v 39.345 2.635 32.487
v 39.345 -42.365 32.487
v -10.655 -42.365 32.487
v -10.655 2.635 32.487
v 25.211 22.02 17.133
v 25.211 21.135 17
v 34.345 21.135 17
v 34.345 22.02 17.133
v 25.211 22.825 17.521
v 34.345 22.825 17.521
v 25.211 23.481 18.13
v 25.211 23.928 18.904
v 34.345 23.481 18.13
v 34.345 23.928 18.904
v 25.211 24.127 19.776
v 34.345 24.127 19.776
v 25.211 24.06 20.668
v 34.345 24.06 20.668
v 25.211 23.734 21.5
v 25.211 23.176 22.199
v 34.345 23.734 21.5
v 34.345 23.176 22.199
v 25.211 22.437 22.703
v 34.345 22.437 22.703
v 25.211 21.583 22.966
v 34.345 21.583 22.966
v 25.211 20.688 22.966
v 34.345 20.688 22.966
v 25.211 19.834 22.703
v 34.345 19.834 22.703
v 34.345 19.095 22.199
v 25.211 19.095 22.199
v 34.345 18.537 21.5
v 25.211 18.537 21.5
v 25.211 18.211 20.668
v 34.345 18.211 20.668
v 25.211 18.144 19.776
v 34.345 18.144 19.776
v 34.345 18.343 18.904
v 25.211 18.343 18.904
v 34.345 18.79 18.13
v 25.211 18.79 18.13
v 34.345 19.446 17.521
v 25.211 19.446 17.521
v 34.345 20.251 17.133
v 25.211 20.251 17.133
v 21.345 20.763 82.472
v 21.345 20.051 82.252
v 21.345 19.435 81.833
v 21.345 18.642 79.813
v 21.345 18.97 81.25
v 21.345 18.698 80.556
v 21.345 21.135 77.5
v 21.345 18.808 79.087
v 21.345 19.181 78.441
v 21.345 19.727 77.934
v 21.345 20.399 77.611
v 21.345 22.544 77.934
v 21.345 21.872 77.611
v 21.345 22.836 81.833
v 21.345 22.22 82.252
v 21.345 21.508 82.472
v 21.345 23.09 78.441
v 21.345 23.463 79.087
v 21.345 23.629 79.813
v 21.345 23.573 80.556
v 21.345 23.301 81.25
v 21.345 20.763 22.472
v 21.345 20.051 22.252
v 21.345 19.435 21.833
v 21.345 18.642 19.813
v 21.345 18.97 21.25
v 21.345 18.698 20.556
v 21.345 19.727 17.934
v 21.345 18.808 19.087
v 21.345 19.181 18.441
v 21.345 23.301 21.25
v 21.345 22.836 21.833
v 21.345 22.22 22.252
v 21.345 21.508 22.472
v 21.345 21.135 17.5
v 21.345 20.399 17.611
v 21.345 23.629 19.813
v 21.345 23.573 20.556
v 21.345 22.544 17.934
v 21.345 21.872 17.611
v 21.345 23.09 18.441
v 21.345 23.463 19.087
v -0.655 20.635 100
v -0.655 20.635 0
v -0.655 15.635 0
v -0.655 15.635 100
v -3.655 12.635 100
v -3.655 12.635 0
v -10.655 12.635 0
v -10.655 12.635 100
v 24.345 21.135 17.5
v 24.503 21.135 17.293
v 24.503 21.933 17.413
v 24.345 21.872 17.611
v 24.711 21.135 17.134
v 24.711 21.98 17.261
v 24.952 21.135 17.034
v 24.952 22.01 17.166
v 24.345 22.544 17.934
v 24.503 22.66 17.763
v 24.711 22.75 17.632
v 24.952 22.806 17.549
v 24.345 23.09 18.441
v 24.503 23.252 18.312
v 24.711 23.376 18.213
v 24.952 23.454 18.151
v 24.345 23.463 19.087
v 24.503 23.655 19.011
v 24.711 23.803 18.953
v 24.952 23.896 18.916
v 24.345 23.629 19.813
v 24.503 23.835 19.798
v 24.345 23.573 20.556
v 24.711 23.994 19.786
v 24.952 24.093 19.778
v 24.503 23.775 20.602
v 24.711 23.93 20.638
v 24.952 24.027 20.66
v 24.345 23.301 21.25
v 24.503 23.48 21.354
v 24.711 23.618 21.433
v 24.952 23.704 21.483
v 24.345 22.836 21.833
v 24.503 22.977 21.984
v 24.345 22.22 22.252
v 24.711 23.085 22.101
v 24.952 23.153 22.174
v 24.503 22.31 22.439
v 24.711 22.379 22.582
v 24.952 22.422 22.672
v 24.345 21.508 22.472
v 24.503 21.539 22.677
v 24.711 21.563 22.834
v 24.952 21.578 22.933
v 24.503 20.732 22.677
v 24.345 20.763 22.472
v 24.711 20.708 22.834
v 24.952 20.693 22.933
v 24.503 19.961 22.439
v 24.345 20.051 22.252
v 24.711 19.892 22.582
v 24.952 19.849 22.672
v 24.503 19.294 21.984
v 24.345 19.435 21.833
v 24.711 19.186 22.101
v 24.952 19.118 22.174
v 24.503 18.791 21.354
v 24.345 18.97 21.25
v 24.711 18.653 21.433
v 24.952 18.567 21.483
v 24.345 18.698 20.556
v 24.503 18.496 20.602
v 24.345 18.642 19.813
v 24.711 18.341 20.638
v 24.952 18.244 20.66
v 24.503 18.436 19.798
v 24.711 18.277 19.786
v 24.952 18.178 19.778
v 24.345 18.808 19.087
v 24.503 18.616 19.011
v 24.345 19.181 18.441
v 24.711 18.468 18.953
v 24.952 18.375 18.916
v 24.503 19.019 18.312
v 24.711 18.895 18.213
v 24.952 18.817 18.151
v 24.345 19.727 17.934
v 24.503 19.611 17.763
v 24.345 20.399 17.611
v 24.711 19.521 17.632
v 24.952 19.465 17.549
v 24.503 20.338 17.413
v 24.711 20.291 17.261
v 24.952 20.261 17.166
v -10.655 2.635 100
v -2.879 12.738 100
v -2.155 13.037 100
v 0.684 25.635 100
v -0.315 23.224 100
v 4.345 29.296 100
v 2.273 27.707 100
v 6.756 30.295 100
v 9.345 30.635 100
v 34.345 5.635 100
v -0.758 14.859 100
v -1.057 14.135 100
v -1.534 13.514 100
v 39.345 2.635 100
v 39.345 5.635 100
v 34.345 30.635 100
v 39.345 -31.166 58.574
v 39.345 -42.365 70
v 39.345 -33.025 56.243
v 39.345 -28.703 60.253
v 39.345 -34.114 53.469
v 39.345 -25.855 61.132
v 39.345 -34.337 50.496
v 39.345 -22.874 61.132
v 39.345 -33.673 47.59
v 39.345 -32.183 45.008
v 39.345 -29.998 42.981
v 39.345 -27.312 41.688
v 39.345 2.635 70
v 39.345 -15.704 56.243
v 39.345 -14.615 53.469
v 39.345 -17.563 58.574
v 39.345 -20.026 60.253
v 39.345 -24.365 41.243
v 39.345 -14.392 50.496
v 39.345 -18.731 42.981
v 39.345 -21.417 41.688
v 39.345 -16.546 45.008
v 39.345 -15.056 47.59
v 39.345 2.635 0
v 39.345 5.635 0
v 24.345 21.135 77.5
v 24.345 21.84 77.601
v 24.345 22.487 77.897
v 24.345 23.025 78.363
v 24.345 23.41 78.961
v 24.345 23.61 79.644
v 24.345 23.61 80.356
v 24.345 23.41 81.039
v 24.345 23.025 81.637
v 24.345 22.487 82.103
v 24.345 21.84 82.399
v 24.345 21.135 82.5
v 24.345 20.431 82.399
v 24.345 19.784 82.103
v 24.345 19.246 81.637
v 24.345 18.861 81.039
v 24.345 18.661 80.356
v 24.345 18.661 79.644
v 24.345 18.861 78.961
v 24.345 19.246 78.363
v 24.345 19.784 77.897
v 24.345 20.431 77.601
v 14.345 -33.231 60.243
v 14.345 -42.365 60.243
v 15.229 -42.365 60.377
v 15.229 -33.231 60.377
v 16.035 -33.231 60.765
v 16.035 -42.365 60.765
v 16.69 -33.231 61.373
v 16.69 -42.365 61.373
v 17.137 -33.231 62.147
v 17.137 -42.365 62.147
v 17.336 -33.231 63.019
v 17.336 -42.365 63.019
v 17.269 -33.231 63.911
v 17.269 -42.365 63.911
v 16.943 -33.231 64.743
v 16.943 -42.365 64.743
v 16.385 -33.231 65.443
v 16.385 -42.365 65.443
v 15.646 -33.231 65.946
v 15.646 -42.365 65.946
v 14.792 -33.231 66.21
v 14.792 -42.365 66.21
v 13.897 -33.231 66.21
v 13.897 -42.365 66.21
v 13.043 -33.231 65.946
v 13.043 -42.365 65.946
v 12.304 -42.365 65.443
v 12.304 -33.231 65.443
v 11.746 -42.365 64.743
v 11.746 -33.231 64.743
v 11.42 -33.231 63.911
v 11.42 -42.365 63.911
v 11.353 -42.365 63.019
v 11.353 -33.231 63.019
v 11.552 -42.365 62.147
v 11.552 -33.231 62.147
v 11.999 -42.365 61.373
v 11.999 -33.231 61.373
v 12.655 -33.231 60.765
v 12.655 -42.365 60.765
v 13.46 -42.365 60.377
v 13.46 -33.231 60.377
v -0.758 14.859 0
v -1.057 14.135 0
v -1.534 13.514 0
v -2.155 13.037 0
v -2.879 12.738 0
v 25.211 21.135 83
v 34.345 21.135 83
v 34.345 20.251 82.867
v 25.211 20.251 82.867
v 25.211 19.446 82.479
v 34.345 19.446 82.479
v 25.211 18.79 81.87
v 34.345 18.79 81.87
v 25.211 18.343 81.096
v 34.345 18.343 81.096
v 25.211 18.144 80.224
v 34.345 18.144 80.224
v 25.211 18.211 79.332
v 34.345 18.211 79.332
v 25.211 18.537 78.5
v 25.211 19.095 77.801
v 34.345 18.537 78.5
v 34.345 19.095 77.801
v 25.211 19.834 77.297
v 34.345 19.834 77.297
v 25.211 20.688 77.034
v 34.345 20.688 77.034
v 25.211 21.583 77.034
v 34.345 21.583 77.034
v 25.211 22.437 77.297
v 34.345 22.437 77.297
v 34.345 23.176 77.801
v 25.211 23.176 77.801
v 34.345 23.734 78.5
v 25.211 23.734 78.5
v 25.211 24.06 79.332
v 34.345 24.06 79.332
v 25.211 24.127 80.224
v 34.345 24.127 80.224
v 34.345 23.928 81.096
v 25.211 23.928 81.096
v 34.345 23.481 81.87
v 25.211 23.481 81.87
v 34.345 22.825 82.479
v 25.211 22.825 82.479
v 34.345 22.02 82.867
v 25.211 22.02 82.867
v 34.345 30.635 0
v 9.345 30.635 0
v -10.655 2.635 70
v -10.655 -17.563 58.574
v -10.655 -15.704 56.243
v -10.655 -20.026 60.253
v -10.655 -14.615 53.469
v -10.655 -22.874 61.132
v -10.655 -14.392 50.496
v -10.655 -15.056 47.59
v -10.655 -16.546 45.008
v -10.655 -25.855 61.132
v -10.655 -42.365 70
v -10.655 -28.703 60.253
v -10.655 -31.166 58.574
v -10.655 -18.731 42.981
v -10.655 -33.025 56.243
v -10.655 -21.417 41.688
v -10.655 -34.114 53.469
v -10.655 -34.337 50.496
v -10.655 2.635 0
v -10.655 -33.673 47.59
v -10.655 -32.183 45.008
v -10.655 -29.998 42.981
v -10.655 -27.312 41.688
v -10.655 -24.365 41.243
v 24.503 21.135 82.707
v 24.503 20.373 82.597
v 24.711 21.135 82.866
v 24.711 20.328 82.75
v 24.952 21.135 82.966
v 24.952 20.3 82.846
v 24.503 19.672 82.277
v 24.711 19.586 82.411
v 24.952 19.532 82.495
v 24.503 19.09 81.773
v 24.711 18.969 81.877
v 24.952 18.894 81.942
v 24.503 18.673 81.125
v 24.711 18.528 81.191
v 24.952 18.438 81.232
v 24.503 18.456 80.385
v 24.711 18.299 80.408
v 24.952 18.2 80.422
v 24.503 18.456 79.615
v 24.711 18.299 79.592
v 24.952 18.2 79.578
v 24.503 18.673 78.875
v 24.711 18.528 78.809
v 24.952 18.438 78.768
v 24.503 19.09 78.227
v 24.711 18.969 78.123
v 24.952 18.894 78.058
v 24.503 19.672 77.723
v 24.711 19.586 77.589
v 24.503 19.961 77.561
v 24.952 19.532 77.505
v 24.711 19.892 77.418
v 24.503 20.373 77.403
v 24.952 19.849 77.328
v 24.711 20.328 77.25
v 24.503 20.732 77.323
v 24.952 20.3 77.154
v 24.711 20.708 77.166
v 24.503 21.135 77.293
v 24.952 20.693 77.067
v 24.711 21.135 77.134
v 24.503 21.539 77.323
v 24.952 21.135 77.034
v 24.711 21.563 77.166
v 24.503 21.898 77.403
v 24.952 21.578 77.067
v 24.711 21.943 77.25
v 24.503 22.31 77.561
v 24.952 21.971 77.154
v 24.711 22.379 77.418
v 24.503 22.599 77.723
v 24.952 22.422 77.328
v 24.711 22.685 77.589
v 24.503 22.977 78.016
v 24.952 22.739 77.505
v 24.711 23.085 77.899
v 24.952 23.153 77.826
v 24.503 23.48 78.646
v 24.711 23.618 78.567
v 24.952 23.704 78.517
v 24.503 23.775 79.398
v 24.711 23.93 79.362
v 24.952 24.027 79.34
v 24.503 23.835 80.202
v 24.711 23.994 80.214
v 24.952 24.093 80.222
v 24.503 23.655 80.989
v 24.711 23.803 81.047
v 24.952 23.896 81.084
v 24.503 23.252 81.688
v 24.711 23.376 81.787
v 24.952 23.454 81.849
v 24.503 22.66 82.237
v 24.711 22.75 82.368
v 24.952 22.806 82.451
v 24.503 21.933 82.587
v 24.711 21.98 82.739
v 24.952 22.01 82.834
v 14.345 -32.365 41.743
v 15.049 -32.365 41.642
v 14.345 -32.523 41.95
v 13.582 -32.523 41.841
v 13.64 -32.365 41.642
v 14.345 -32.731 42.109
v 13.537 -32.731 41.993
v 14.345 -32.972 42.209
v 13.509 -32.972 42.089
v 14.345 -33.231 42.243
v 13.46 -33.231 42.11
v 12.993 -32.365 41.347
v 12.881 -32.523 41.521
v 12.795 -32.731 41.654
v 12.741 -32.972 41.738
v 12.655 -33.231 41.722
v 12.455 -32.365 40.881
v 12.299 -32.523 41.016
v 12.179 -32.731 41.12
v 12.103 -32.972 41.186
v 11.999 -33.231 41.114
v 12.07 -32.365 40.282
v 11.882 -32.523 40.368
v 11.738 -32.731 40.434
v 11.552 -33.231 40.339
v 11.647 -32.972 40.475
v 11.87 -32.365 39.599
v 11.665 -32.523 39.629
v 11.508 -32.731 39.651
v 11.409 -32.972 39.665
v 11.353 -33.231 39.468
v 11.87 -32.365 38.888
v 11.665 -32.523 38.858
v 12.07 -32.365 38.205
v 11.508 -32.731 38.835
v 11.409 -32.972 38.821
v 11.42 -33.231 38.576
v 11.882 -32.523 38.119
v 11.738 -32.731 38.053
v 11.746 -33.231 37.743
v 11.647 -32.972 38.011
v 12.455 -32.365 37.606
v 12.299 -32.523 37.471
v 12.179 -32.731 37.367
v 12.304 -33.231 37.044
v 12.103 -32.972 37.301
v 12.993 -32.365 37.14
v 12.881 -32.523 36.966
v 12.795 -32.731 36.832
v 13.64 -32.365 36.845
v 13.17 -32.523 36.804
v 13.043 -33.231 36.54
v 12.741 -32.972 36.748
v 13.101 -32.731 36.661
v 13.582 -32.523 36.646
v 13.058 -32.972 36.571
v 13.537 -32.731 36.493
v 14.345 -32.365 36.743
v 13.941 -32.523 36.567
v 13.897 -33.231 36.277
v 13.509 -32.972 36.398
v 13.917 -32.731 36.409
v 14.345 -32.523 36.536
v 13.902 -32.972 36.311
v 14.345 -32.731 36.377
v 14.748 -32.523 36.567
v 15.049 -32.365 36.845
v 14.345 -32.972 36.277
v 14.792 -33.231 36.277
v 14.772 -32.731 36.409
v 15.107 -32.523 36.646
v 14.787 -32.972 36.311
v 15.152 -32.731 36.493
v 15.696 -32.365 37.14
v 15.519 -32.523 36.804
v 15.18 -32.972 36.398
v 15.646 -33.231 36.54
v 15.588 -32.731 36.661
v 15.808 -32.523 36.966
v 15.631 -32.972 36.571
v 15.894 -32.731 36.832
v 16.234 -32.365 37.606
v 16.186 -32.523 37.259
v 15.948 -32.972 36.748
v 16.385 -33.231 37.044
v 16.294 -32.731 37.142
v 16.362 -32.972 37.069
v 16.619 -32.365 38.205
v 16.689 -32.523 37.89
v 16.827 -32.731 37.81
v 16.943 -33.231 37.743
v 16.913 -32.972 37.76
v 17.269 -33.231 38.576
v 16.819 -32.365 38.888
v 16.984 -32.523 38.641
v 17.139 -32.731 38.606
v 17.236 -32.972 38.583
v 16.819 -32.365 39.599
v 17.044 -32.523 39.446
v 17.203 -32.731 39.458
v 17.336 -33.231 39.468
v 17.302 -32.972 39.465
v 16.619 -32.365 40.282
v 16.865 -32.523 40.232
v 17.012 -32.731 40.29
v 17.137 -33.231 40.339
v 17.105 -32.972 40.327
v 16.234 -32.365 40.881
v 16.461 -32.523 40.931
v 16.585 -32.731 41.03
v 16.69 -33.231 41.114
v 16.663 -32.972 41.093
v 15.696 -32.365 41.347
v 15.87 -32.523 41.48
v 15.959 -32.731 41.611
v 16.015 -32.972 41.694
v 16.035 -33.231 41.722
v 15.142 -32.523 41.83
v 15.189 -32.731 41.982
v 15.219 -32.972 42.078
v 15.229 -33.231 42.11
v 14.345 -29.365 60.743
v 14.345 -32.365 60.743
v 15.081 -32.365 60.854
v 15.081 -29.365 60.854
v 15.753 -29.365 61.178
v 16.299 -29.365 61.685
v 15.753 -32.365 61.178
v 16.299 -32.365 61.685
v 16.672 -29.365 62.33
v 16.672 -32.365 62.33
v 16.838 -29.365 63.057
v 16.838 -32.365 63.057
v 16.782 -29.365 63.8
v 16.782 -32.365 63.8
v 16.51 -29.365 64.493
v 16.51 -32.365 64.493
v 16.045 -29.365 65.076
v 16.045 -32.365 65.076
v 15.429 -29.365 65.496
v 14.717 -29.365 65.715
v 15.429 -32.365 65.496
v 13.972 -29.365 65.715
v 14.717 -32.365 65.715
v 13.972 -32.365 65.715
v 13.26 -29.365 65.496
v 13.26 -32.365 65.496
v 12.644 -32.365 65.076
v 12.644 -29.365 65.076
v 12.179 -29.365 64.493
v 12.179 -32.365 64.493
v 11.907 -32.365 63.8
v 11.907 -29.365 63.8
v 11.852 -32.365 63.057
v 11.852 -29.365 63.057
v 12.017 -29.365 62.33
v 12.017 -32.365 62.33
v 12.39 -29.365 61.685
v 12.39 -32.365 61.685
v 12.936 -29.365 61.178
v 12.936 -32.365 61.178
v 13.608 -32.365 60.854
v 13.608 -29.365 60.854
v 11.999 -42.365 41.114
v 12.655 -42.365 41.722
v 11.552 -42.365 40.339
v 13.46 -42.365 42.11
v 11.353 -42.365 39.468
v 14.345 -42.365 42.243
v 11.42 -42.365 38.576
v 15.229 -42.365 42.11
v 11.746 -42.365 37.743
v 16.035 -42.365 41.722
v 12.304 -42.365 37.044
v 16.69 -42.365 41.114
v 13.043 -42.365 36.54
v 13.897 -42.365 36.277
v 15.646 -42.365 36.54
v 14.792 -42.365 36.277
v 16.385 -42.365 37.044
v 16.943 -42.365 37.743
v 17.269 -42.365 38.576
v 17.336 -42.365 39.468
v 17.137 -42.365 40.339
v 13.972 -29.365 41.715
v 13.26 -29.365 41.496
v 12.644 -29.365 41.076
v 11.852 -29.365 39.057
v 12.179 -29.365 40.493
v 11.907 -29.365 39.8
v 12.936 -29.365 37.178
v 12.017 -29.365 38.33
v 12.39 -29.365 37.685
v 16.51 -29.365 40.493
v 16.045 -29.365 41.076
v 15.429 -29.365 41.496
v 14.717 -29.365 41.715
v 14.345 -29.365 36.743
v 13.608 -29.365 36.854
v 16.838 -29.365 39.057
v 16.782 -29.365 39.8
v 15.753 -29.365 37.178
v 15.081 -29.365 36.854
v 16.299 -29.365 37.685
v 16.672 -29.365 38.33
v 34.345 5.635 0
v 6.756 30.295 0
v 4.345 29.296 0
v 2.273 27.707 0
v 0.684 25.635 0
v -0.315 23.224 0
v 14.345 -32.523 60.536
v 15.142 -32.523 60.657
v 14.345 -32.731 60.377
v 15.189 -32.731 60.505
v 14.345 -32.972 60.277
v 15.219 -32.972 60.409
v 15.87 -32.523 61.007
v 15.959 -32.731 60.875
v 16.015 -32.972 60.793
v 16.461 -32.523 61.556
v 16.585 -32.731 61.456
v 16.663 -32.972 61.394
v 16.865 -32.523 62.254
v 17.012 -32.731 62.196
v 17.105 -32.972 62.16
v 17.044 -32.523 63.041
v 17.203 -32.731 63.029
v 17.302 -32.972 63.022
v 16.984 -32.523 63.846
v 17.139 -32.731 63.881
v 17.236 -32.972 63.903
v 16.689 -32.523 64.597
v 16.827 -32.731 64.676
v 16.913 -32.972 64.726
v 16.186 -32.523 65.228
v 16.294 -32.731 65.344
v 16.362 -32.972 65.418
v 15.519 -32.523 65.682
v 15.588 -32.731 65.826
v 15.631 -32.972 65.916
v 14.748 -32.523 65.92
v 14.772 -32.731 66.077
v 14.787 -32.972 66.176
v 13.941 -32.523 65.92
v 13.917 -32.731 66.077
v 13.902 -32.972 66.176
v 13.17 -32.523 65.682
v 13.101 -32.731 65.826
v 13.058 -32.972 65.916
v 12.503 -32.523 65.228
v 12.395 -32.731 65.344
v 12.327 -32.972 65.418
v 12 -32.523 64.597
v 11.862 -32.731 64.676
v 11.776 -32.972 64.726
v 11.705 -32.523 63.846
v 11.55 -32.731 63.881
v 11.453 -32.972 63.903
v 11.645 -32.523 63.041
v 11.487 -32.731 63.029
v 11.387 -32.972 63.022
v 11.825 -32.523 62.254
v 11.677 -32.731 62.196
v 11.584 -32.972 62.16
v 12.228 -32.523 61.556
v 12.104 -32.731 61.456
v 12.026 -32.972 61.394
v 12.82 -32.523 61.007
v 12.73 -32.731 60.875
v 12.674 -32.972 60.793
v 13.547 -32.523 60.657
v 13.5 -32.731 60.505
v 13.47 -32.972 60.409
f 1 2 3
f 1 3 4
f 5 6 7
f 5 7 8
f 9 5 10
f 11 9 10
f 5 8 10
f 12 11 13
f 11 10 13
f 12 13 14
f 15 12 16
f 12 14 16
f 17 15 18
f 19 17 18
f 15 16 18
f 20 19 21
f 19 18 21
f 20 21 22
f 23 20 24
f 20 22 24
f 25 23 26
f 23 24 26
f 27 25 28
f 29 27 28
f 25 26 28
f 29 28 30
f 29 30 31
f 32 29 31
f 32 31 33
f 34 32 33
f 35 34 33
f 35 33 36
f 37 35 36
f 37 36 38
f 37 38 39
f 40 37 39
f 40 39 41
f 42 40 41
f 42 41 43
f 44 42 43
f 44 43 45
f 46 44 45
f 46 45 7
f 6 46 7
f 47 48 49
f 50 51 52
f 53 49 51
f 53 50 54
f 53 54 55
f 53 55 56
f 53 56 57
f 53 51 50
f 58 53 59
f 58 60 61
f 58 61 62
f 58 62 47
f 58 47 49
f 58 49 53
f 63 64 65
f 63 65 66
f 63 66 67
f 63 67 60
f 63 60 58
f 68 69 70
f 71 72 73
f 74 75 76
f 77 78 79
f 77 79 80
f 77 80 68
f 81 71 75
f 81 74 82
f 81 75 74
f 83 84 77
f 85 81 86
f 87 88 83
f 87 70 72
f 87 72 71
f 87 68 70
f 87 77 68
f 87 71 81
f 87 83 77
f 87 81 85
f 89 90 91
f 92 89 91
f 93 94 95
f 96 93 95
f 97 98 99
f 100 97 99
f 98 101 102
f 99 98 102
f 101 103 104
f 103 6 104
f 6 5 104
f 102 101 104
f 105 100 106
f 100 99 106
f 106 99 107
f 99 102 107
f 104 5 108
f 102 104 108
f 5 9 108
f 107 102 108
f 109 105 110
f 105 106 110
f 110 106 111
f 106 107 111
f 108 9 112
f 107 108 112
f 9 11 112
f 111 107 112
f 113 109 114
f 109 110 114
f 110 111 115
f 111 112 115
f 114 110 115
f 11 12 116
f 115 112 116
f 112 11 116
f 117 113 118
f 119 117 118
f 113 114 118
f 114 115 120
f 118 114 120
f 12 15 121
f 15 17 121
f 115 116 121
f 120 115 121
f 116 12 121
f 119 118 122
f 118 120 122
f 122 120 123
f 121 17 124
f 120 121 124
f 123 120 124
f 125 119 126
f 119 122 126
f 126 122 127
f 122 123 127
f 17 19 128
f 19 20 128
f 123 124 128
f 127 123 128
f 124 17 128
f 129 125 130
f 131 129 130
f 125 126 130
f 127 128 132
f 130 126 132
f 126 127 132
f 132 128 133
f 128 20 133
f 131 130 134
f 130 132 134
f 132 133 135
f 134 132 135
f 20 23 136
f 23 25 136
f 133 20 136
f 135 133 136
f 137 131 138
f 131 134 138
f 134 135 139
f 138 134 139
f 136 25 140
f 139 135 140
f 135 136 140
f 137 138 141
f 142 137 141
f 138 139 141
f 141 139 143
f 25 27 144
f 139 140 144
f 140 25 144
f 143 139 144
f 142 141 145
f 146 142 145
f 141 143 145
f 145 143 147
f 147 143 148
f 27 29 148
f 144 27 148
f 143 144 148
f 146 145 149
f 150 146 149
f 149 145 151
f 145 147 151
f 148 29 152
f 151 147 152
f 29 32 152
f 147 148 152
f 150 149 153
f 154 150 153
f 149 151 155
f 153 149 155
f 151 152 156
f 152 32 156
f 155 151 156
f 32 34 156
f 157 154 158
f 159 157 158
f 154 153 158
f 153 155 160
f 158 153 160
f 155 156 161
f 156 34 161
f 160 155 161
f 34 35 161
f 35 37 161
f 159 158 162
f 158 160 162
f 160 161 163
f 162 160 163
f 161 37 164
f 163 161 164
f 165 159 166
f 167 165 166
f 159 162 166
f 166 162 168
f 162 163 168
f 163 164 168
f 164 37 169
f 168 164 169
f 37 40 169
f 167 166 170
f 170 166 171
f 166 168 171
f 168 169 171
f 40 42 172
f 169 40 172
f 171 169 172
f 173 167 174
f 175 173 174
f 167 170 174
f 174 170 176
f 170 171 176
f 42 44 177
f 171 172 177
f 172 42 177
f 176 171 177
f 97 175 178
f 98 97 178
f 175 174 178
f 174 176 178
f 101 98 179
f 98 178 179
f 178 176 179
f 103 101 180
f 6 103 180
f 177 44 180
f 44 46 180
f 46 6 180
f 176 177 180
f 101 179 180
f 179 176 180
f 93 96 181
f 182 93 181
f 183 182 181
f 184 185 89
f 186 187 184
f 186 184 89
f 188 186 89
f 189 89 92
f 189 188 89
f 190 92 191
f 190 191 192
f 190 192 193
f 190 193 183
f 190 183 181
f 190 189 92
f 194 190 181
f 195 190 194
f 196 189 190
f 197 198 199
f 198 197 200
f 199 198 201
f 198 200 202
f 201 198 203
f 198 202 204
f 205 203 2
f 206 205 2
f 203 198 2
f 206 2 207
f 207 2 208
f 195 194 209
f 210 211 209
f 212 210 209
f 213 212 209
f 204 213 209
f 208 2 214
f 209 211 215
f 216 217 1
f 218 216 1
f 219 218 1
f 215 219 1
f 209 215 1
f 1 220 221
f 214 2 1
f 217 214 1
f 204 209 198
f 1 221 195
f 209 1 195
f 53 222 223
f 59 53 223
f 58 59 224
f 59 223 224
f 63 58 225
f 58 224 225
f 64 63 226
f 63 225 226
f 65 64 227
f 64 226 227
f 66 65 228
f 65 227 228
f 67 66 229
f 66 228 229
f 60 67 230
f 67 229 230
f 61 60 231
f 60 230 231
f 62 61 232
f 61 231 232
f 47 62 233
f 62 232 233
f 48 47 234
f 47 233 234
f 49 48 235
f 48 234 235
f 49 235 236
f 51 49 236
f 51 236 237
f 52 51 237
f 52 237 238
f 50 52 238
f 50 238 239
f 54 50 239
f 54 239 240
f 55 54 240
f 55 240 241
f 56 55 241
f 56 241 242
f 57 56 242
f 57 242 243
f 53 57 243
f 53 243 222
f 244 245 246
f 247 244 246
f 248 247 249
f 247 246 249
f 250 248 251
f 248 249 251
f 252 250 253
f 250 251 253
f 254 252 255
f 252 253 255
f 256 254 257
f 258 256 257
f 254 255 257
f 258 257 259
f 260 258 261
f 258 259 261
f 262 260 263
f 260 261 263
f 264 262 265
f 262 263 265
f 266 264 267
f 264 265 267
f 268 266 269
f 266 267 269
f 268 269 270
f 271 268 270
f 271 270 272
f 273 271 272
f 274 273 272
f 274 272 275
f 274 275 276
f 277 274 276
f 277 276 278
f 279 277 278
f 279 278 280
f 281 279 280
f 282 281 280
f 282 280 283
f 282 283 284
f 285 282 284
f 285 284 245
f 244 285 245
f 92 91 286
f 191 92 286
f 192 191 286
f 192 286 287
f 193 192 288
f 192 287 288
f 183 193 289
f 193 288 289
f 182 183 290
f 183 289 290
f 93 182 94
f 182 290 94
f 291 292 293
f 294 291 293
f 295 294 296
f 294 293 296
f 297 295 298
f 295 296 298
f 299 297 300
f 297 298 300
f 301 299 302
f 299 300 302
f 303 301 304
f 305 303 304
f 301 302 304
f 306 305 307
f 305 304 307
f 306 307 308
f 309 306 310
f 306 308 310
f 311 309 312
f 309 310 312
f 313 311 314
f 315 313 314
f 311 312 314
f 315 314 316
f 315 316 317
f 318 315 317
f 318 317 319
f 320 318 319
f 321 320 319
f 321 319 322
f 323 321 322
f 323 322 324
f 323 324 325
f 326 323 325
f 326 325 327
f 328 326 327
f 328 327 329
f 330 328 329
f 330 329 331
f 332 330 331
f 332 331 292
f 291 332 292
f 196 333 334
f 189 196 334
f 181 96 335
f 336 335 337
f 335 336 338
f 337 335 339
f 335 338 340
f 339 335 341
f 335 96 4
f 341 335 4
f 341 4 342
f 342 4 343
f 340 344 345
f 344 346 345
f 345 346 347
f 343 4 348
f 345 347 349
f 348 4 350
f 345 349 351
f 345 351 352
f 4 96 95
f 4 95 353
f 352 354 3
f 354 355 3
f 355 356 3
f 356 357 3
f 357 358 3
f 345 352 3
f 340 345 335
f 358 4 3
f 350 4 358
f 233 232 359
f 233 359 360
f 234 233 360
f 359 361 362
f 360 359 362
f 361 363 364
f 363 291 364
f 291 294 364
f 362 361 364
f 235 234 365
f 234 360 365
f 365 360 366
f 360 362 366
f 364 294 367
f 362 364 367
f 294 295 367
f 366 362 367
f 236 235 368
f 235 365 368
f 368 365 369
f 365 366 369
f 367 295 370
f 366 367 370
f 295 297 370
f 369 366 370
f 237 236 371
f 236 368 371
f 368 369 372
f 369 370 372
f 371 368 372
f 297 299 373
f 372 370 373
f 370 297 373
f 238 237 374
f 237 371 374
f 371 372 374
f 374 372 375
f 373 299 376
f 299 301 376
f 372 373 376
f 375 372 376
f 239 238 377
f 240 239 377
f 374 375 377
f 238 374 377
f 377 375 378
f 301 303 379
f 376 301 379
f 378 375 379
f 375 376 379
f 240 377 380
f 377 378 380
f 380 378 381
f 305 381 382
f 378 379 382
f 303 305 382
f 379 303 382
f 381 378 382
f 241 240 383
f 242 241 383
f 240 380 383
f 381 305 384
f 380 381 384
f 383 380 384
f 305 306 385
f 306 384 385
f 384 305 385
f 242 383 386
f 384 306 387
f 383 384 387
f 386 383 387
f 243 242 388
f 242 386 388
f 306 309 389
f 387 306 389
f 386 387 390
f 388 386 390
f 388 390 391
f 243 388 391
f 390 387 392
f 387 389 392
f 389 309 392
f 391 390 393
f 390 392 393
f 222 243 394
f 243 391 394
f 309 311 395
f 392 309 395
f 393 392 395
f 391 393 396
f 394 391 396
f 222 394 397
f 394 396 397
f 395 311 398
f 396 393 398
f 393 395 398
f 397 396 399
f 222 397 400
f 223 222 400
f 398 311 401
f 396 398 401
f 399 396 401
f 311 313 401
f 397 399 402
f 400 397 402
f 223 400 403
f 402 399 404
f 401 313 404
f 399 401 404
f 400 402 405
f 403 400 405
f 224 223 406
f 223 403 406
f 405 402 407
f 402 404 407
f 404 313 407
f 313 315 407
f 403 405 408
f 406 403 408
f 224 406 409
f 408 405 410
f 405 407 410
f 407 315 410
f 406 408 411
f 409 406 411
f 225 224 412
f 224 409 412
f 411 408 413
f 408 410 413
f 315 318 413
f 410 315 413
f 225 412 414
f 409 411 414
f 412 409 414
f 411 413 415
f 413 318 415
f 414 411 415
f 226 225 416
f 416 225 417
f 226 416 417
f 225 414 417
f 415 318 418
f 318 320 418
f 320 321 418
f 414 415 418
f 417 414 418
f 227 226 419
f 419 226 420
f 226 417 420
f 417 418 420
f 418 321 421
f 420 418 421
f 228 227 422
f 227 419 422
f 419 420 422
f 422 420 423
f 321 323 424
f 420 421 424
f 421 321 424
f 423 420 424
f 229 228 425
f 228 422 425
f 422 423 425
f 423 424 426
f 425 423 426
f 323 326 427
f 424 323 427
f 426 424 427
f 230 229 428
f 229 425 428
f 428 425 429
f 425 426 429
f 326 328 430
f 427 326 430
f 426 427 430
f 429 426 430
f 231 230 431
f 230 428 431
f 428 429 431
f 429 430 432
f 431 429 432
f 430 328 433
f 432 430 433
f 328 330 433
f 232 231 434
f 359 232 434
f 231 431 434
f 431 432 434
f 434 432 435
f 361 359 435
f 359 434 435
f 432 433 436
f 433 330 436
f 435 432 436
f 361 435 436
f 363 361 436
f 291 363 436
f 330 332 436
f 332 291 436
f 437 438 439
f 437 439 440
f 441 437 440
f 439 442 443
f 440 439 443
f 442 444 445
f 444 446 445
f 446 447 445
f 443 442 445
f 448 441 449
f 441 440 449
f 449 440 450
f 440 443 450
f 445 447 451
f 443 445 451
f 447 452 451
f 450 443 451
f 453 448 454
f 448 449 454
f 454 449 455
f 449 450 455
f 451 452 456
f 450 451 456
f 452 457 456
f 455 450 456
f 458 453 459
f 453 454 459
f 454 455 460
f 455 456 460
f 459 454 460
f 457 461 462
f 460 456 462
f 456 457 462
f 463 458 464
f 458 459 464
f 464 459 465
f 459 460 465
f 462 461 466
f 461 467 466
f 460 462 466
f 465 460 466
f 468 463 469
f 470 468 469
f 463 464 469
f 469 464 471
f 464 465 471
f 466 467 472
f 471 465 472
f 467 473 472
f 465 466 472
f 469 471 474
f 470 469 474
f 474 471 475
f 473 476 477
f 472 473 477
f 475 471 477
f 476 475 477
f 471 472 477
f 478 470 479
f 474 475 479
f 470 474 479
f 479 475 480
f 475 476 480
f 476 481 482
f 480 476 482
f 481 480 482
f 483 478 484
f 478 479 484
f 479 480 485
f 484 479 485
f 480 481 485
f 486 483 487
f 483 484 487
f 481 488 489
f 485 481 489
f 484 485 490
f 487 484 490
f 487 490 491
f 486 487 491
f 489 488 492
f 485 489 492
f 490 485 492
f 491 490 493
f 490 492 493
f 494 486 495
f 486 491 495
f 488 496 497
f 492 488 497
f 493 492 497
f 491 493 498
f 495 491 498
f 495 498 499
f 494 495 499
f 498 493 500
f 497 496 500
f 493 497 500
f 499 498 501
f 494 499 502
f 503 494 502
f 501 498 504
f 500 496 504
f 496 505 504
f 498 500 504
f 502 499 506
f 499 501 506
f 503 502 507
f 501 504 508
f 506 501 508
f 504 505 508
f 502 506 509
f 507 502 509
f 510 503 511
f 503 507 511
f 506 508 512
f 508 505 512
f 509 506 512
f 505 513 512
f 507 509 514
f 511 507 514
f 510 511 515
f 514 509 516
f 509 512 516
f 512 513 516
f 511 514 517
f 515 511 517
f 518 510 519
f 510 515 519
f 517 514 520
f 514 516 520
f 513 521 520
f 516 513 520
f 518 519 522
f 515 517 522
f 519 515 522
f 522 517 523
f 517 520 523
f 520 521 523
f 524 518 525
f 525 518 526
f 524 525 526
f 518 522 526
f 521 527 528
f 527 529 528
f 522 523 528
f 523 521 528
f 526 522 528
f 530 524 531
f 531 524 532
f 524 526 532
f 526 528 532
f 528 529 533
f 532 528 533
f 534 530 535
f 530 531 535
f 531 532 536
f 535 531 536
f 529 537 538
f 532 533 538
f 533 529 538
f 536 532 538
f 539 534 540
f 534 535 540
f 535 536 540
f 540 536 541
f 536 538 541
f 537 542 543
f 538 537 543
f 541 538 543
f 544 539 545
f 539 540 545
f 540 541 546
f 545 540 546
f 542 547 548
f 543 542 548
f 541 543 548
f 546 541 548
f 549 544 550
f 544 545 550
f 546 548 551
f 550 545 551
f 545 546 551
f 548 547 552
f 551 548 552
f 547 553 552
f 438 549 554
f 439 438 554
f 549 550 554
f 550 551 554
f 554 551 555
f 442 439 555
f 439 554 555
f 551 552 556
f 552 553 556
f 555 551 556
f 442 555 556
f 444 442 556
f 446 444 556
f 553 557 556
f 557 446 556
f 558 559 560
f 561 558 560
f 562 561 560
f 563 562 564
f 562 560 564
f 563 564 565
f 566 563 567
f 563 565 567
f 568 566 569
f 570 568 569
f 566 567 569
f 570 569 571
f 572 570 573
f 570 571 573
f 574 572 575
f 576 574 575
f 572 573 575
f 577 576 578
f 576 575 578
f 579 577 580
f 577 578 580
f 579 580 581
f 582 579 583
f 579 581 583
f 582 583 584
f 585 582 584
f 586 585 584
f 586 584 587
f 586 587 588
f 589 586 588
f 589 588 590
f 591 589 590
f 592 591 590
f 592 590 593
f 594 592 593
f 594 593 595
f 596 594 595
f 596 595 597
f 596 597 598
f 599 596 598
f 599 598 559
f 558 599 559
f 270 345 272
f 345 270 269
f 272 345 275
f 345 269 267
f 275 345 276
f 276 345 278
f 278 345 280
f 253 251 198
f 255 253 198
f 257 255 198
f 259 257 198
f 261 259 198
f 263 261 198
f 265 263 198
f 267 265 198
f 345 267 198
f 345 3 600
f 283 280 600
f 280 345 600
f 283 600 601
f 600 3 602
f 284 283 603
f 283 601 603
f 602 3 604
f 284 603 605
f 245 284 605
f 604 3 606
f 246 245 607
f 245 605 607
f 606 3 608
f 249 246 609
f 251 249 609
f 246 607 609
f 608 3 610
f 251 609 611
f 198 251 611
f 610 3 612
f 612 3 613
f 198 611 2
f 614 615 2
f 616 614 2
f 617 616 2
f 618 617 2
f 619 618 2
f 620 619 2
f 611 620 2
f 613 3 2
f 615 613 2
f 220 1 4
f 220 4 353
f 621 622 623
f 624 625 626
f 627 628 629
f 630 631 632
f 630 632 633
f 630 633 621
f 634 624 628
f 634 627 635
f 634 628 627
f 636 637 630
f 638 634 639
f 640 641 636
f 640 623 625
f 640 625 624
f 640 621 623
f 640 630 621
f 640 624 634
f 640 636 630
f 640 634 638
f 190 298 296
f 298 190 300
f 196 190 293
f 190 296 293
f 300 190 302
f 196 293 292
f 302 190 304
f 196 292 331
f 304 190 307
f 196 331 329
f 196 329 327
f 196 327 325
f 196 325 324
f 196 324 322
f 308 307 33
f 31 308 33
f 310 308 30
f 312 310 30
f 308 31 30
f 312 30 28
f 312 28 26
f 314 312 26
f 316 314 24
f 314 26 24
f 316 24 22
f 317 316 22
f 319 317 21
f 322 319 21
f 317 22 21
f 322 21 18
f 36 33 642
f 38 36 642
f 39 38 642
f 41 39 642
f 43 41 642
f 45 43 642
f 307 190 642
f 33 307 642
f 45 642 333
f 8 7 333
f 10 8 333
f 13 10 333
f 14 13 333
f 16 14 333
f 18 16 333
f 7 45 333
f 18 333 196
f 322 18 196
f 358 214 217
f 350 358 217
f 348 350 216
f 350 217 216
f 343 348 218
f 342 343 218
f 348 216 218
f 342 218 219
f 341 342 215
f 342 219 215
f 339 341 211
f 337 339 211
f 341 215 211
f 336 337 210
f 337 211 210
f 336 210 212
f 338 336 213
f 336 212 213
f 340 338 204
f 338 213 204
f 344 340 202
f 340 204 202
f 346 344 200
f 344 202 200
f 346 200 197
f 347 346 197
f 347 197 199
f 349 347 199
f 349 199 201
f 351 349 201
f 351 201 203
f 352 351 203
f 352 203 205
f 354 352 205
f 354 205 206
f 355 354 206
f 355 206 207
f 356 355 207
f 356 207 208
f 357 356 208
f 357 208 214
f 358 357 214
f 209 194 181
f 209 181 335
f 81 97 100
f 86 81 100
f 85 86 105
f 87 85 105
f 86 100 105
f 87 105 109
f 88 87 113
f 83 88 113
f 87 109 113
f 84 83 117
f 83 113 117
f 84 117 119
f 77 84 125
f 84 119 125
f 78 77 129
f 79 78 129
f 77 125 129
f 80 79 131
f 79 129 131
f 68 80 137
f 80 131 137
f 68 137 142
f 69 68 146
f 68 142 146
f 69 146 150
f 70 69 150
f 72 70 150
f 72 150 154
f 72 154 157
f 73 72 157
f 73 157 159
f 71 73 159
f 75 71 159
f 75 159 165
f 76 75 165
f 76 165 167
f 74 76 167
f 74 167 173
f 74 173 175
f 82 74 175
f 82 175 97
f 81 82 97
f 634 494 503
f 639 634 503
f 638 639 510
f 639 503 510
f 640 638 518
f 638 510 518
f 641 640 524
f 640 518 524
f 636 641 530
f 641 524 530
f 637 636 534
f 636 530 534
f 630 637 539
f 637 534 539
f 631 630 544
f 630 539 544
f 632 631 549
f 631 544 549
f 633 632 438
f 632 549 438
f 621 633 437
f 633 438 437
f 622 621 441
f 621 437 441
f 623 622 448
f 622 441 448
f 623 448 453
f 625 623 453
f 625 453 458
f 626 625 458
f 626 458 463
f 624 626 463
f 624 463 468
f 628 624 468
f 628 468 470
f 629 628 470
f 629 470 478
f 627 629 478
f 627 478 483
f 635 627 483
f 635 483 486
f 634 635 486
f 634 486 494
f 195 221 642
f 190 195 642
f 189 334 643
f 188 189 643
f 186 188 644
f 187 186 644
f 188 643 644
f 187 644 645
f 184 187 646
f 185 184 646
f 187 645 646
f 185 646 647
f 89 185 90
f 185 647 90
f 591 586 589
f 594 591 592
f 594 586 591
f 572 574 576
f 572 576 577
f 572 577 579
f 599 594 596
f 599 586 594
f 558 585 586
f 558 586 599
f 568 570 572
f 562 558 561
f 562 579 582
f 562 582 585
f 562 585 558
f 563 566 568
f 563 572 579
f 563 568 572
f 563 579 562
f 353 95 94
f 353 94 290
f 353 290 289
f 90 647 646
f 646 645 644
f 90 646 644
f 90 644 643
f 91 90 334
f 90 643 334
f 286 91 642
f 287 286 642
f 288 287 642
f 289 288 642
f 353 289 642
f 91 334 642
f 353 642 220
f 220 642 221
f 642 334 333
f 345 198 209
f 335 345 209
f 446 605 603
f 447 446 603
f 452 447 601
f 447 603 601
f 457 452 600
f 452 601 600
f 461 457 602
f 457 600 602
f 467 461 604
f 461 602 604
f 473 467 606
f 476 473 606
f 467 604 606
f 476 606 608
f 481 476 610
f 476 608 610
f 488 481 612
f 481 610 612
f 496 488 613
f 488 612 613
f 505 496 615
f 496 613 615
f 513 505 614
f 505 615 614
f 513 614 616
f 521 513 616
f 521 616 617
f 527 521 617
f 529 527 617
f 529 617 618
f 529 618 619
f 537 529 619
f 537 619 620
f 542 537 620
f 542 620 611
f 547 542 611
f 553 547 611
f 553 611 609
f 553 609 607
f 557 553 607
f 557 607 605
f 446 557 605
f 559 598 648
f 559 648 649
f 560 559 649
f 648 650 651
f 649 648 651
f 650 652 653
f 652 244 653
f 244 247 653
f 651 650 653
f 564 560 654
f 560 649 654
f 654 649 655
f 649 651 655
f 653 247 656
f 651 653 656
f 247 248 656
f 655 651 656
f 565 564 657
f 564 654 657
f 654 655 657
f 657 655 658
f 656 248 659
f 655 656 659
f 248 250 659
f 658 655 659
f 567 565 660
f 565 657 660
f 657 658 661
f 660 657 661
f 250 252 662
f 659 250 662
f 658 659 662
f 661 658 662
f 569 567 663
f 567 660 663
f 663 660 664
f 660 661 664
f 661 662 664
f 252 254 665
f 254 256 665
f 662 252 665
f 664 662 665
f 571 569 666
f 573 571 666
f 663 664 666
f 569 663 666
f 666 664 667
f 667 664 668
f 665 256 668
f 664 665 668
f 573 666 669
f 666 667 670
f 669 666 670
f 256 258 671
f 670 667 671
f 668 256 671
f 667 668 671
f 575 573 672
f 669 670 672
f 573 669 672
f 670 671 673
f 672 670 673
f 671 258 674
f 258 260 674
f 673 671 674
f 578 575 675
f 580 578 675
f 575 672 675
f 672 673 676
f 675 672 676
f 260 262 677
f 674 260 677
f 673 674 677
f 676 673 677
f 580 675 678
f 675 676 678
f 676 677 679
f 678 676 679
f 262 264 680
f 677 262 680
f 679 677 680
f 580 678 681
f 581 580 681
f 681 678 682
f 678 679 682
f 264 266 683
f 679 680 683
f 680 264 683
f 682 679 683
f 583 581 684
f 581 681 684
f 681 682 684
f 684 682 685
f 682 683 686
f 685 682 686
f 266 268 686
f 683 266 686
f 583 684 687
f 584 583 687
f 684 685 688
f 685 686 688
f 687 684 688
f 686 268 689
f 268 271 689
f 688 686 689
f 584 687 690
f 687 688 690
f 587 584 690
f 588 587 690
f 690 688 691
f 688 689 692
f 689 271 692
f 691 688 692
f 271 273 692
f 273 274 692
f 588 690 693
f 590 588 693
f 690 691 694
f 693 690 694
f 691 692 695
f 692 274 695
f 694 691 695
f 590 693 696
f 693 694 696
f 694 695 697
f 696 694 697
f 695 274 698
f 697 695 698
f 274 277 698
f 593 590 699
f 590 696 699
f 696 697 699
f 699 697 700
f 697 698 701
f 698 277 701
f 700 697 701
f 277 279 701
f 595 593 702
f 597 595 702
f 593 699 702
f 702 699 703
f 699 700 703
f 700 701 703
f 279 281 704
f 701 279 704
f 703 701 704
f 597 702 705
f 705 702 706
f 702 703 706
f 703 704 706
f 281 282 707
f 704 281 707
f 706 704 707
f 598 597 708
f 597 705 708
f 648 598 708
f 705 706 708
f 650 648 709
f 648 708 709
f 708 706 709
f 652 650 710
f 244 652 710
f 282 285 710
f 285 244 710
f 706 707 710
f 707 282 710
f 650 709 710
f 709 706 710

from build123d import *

# Parameters (mm, degrees)
BOSS_EXTRUDE1_DEPTH = 100
SKETCH3_W           = 32.48675427
SKETCH3_H           = 45
CUT_EXTRUDE5_DEPTH  = 120.560658656
SKETCH7_W           = 30
SKETCH7_H           = 45
CUT_EXTRUDE7_DEPTH  = 120.560658656
SKETCH8_R           = 10
CUT_EXTRUDE8_DEPTH  = 120.560658656
SKETCH9_R           = 2.5
CUT_EXTRUDE9_DEPTH  = 13
SKETCH10_R          = 3
CUT_EXTRUDE10_DEPTH = 10
FILLET1_R           = 1
FILLET2_R           = 1
SKETCH11_R          = 2.5
CUT_EXTRUDE11_DEPTH = 13
SKETCH12_R          = 3
CUT_EXTRUDE12_DEPTH = 10
FILLET3_R           = 1


with BuildPart() as part:
    # Sketch2 → Boss-Extrude1 (new body)
    with BuildSketch(Plane.XY):
        with BuildLine():
            Line((-10.655452858, -42.364502809), (39.344547142, -42.364502809))
            Line((39.344547142, -42.364502809), (39.344547142, 2.635497191))
            Line((39.344547142, 2.635497191), (39.344547142, 5.635497191))
            Line((39.344547142, 5.635497191), (34.344547142, 5.635497191))
            Line((34.344547142, 5.635497191), (34.344547142, 30.635497191))
            Line((34.344547142, 30.635497191), (9.344547142, 30.635497191))
            ThreePointArc((9.344547142, 30.635497191), (2.27347933, 27.706565003), (-0.655452858, 20.635497191))
            Line((-0.655452858, 20.635497191), (-0.655452858, 15.635497191))
            ThreePointArc((-0.655452858, 15.635497191), (-1.534132514, 13.514176848), (-3.655452858, 12.635497191))
            Line((-3.655452858, 12.635497191), (-10.655452858, 12.635497191))
            Line((-10.655452858, 12.635497191), (-10.655452858, -42.364502809))
        make_face()
    extrude(amount=BOSS_EXTRUDE1_DEPTH)

    # Sketch3 → Cut-Extrude5 (cut, through all)
    with BuildSketch(Plane(origin=(39.344547142, 0, 0), x_dir=(0, 0, -1), z_dir=(1, 0, 0))):
        with Locations((-16.243377135, -19.864502809)):
            Rectangle(SKETCH3_W, SKETCH3_H)
    extrude(amount=-CUT_EXTRUDE5_DEPTH, mode=Mode.SUBTRACT)

    # Sketch7 → Cut-Extrude7 (cut, through all)
    with BuildSketch(Plane(origin=(39.344547142, 0, 0), x_dir=(0, 0, -1), z_dir=(1, 0, 0))):
        with Locations((-85, -19.864502809)):
            Rectangle(SKETCH7_W, SKETCH7_H)
    extrude(amount=-CUT_EXTRUDE7_DEPTH, mode=Mode.SUBTRACT)

    # Sketch8 → Cut-Extrude8 (cut, through all)
    with BuildSketch(Plane(origin=(39.344547142, 0, 0), x_dir=(0, 0, -1), z_dir=(1, 0, 0))):
        with Locations((-51.243377135, -24.364502809)):
            Circle(SKETCH8_R)
    extrude(amount=-CUT_EXTRUDE8_DEPTH, mode=Mode.SUBTRACT)

    # Sketch9 → Cut-Extrude9 (cut)
    with BuildSketch(Plane(origin=(34.344547142, 0, 0), x_dir=(0, 0, -1), z_dir=(1, 0, 0))):
        with Locations((-20, 21.135497191)):
            Circle(SKETCH9_R)
        with Locations((-80, 21.135497191)):
            Circle(SKETCH9_R)
    extrude(amount=-CUT_EXTRUDE9_DEPTH, mode=Mode.SUBTRACT)

    # Sketch10 → Cut-Extrude10 (cut)
    with BuildSketch(Plane(origin=(34.344547142, 0, 0), x_dir=(0, 0, -1), z_dir=(1, 0, 0))):
        with Locations((-20, 21.135497191)):
            Circle(SKETCH10_R)
        with Locations(Location((-80, 21.135497191, 0), (0, 0, 180))):
            Circle(SKETCH10_R)
    extrude(amount=-CUT_EXTRUDE10_DEPTH, mode=Mode.SUBTRACT)

    # Fillet1
    # the kernel refuses this fillet: 1 mm, written as the material it adds along each edge
    with BuildSketch(Plane(origin=(24.344547142, 21.135497191, 20), x_dir=(0, 0, -1), z_dir=(0, -1, 0))) as fillet1_piece_1:
        with BuildLine():
            CenterArc((2, 0.866025404), FILLET1_R, 300, 60)
            Line((2.5, 0), (2.51, -0.017320508))
            ThreePointArc((2.51, -0.017320508), (2.75, -0.02), (3, -0.02))
            Line((3, -0.02), (3.02, 0))
            Line((3.02, 0), (3.02, 0.866025404))
            Line((3.02, 0.866025404), (3, 0.866025404))
        make_face()
    revolve(axis=Axis((24.344547142, 21.135497191, 20), (1, 0, 0)))

    # Fillet2
    # the kernel refuses this fillet: 1 mm, written as the material it adds along each edge
    with BuildSketch(Plane(origin=(24.344547142, 21.135497191, 80), x_dir=(0, 0, 1), z_dir=(0, 1, 0))) as fillet2_piece_1:
        with BuildLine():
            CenterArc((2, 0.866025404), FILLET2_R, 300, 60)
            Line((2.5, 0), (2.51, -0.017320508))
            ThreePointArc((2.51, -0.017320508), (2.75, -0.02), (3, -0.02))
            Line((3, -0.02), (3.02, 0))
            Line((3.02, 0), (3.02, 0.866025404))
            Line((3.02, 0.866025404), (3, 0.866025404))
        make_face()
    revolve(axis=Axis((24.344547142, 21.135497191, 80), (1, 0, 0)))

    # Sketch11 → Cut-Extrude11 (cut)
    with BuildSketch(Plane.XZ.offset(42.364502809)):
        with Locations(Location((14.344547142, 63.243377135, 0), (0, 0, 270))):
            Circle(SKETCH11_R)
        with Locations(Location((14.344547142, 39.243377135, 0), (0, 0, 270))):
            Circle(SKETCH11_R)
    extrude(amount=-CUT_EXTRUDE11_DEPTH, mode=Mode.SUBTRACT)

    # Sketch12 → Cut-Extrude12 (cut)
    with BuildSketch(Plane.XZ.offset(42.364502809)):
        with Locations(Location((14.344547142, 63.243377135, 0), (0, 0, 270))):
            Circle(SKETCH12_R)
        with Locations(Location((14.344547142, 39.243377135, 0), (0, 0, 90))):
            Circle(SKETCH12_R)
    extrude(amount=-CUT_EXTRUDE12_DEPTH, mode=Mode.SUBTRACT)

    # Fillet3
    # the kernel refuses this fillet: 1 mm, written as the material it adds along each edge
    with BuildSketch(Plane(origin=(14.344547142, -32.364502809, 63.243377135), x_dir=(0, 0, -1), z_dir=(-1, 0, 0))) as fillet3_piece_1:
        with BuildLine():
            CenterArc((2, 0.866025404), FILLET3_R, 300, 60)
            Line((2.5, 0), (2.51, -0.017320508))
            ThreePointArc((2.51, -0.017320508), (2.75, -0.02), (3, -0.02))
            Line((3, -0.02), (3.02, 0))
            Line((3.02, 0), (3.02, 0.866025404))
            Line((3.02, 0.866025404), (3, 0.866025404))
        make_face()
    revolve(axis=Axis((14.344547142, -32.364502809, 63.243377135), (0, -1, 0)))
    with BuildSketch(Plane(origin=(14.344547142, -32.364502809, 39.243377135), x_dir=(0, 0, 1), z_dir=(1, 0, 0))) as fillet3_piece_2:
        with BuildLine():
            CenterArc((2, 0.866025404), FILLET3_R, 300, 60)
            Line((2.5, 0), (2.51, -0.017320508))
            ThreePointArc((2.51, -0.017320508), (2.75, -0.02), (3, -0.02))
            Line((3, -0.02), (3.02, 0))
            Line((3.02, 0), (3.02, 0.866025404))
            Line((3.02, 0.866025404), (3, 0.866025404))
        make_face()
    revolve(axis=Axis((14.344547142, -32.364502809, 39.243377135), (0, -1, 0)))


solid = part.part
